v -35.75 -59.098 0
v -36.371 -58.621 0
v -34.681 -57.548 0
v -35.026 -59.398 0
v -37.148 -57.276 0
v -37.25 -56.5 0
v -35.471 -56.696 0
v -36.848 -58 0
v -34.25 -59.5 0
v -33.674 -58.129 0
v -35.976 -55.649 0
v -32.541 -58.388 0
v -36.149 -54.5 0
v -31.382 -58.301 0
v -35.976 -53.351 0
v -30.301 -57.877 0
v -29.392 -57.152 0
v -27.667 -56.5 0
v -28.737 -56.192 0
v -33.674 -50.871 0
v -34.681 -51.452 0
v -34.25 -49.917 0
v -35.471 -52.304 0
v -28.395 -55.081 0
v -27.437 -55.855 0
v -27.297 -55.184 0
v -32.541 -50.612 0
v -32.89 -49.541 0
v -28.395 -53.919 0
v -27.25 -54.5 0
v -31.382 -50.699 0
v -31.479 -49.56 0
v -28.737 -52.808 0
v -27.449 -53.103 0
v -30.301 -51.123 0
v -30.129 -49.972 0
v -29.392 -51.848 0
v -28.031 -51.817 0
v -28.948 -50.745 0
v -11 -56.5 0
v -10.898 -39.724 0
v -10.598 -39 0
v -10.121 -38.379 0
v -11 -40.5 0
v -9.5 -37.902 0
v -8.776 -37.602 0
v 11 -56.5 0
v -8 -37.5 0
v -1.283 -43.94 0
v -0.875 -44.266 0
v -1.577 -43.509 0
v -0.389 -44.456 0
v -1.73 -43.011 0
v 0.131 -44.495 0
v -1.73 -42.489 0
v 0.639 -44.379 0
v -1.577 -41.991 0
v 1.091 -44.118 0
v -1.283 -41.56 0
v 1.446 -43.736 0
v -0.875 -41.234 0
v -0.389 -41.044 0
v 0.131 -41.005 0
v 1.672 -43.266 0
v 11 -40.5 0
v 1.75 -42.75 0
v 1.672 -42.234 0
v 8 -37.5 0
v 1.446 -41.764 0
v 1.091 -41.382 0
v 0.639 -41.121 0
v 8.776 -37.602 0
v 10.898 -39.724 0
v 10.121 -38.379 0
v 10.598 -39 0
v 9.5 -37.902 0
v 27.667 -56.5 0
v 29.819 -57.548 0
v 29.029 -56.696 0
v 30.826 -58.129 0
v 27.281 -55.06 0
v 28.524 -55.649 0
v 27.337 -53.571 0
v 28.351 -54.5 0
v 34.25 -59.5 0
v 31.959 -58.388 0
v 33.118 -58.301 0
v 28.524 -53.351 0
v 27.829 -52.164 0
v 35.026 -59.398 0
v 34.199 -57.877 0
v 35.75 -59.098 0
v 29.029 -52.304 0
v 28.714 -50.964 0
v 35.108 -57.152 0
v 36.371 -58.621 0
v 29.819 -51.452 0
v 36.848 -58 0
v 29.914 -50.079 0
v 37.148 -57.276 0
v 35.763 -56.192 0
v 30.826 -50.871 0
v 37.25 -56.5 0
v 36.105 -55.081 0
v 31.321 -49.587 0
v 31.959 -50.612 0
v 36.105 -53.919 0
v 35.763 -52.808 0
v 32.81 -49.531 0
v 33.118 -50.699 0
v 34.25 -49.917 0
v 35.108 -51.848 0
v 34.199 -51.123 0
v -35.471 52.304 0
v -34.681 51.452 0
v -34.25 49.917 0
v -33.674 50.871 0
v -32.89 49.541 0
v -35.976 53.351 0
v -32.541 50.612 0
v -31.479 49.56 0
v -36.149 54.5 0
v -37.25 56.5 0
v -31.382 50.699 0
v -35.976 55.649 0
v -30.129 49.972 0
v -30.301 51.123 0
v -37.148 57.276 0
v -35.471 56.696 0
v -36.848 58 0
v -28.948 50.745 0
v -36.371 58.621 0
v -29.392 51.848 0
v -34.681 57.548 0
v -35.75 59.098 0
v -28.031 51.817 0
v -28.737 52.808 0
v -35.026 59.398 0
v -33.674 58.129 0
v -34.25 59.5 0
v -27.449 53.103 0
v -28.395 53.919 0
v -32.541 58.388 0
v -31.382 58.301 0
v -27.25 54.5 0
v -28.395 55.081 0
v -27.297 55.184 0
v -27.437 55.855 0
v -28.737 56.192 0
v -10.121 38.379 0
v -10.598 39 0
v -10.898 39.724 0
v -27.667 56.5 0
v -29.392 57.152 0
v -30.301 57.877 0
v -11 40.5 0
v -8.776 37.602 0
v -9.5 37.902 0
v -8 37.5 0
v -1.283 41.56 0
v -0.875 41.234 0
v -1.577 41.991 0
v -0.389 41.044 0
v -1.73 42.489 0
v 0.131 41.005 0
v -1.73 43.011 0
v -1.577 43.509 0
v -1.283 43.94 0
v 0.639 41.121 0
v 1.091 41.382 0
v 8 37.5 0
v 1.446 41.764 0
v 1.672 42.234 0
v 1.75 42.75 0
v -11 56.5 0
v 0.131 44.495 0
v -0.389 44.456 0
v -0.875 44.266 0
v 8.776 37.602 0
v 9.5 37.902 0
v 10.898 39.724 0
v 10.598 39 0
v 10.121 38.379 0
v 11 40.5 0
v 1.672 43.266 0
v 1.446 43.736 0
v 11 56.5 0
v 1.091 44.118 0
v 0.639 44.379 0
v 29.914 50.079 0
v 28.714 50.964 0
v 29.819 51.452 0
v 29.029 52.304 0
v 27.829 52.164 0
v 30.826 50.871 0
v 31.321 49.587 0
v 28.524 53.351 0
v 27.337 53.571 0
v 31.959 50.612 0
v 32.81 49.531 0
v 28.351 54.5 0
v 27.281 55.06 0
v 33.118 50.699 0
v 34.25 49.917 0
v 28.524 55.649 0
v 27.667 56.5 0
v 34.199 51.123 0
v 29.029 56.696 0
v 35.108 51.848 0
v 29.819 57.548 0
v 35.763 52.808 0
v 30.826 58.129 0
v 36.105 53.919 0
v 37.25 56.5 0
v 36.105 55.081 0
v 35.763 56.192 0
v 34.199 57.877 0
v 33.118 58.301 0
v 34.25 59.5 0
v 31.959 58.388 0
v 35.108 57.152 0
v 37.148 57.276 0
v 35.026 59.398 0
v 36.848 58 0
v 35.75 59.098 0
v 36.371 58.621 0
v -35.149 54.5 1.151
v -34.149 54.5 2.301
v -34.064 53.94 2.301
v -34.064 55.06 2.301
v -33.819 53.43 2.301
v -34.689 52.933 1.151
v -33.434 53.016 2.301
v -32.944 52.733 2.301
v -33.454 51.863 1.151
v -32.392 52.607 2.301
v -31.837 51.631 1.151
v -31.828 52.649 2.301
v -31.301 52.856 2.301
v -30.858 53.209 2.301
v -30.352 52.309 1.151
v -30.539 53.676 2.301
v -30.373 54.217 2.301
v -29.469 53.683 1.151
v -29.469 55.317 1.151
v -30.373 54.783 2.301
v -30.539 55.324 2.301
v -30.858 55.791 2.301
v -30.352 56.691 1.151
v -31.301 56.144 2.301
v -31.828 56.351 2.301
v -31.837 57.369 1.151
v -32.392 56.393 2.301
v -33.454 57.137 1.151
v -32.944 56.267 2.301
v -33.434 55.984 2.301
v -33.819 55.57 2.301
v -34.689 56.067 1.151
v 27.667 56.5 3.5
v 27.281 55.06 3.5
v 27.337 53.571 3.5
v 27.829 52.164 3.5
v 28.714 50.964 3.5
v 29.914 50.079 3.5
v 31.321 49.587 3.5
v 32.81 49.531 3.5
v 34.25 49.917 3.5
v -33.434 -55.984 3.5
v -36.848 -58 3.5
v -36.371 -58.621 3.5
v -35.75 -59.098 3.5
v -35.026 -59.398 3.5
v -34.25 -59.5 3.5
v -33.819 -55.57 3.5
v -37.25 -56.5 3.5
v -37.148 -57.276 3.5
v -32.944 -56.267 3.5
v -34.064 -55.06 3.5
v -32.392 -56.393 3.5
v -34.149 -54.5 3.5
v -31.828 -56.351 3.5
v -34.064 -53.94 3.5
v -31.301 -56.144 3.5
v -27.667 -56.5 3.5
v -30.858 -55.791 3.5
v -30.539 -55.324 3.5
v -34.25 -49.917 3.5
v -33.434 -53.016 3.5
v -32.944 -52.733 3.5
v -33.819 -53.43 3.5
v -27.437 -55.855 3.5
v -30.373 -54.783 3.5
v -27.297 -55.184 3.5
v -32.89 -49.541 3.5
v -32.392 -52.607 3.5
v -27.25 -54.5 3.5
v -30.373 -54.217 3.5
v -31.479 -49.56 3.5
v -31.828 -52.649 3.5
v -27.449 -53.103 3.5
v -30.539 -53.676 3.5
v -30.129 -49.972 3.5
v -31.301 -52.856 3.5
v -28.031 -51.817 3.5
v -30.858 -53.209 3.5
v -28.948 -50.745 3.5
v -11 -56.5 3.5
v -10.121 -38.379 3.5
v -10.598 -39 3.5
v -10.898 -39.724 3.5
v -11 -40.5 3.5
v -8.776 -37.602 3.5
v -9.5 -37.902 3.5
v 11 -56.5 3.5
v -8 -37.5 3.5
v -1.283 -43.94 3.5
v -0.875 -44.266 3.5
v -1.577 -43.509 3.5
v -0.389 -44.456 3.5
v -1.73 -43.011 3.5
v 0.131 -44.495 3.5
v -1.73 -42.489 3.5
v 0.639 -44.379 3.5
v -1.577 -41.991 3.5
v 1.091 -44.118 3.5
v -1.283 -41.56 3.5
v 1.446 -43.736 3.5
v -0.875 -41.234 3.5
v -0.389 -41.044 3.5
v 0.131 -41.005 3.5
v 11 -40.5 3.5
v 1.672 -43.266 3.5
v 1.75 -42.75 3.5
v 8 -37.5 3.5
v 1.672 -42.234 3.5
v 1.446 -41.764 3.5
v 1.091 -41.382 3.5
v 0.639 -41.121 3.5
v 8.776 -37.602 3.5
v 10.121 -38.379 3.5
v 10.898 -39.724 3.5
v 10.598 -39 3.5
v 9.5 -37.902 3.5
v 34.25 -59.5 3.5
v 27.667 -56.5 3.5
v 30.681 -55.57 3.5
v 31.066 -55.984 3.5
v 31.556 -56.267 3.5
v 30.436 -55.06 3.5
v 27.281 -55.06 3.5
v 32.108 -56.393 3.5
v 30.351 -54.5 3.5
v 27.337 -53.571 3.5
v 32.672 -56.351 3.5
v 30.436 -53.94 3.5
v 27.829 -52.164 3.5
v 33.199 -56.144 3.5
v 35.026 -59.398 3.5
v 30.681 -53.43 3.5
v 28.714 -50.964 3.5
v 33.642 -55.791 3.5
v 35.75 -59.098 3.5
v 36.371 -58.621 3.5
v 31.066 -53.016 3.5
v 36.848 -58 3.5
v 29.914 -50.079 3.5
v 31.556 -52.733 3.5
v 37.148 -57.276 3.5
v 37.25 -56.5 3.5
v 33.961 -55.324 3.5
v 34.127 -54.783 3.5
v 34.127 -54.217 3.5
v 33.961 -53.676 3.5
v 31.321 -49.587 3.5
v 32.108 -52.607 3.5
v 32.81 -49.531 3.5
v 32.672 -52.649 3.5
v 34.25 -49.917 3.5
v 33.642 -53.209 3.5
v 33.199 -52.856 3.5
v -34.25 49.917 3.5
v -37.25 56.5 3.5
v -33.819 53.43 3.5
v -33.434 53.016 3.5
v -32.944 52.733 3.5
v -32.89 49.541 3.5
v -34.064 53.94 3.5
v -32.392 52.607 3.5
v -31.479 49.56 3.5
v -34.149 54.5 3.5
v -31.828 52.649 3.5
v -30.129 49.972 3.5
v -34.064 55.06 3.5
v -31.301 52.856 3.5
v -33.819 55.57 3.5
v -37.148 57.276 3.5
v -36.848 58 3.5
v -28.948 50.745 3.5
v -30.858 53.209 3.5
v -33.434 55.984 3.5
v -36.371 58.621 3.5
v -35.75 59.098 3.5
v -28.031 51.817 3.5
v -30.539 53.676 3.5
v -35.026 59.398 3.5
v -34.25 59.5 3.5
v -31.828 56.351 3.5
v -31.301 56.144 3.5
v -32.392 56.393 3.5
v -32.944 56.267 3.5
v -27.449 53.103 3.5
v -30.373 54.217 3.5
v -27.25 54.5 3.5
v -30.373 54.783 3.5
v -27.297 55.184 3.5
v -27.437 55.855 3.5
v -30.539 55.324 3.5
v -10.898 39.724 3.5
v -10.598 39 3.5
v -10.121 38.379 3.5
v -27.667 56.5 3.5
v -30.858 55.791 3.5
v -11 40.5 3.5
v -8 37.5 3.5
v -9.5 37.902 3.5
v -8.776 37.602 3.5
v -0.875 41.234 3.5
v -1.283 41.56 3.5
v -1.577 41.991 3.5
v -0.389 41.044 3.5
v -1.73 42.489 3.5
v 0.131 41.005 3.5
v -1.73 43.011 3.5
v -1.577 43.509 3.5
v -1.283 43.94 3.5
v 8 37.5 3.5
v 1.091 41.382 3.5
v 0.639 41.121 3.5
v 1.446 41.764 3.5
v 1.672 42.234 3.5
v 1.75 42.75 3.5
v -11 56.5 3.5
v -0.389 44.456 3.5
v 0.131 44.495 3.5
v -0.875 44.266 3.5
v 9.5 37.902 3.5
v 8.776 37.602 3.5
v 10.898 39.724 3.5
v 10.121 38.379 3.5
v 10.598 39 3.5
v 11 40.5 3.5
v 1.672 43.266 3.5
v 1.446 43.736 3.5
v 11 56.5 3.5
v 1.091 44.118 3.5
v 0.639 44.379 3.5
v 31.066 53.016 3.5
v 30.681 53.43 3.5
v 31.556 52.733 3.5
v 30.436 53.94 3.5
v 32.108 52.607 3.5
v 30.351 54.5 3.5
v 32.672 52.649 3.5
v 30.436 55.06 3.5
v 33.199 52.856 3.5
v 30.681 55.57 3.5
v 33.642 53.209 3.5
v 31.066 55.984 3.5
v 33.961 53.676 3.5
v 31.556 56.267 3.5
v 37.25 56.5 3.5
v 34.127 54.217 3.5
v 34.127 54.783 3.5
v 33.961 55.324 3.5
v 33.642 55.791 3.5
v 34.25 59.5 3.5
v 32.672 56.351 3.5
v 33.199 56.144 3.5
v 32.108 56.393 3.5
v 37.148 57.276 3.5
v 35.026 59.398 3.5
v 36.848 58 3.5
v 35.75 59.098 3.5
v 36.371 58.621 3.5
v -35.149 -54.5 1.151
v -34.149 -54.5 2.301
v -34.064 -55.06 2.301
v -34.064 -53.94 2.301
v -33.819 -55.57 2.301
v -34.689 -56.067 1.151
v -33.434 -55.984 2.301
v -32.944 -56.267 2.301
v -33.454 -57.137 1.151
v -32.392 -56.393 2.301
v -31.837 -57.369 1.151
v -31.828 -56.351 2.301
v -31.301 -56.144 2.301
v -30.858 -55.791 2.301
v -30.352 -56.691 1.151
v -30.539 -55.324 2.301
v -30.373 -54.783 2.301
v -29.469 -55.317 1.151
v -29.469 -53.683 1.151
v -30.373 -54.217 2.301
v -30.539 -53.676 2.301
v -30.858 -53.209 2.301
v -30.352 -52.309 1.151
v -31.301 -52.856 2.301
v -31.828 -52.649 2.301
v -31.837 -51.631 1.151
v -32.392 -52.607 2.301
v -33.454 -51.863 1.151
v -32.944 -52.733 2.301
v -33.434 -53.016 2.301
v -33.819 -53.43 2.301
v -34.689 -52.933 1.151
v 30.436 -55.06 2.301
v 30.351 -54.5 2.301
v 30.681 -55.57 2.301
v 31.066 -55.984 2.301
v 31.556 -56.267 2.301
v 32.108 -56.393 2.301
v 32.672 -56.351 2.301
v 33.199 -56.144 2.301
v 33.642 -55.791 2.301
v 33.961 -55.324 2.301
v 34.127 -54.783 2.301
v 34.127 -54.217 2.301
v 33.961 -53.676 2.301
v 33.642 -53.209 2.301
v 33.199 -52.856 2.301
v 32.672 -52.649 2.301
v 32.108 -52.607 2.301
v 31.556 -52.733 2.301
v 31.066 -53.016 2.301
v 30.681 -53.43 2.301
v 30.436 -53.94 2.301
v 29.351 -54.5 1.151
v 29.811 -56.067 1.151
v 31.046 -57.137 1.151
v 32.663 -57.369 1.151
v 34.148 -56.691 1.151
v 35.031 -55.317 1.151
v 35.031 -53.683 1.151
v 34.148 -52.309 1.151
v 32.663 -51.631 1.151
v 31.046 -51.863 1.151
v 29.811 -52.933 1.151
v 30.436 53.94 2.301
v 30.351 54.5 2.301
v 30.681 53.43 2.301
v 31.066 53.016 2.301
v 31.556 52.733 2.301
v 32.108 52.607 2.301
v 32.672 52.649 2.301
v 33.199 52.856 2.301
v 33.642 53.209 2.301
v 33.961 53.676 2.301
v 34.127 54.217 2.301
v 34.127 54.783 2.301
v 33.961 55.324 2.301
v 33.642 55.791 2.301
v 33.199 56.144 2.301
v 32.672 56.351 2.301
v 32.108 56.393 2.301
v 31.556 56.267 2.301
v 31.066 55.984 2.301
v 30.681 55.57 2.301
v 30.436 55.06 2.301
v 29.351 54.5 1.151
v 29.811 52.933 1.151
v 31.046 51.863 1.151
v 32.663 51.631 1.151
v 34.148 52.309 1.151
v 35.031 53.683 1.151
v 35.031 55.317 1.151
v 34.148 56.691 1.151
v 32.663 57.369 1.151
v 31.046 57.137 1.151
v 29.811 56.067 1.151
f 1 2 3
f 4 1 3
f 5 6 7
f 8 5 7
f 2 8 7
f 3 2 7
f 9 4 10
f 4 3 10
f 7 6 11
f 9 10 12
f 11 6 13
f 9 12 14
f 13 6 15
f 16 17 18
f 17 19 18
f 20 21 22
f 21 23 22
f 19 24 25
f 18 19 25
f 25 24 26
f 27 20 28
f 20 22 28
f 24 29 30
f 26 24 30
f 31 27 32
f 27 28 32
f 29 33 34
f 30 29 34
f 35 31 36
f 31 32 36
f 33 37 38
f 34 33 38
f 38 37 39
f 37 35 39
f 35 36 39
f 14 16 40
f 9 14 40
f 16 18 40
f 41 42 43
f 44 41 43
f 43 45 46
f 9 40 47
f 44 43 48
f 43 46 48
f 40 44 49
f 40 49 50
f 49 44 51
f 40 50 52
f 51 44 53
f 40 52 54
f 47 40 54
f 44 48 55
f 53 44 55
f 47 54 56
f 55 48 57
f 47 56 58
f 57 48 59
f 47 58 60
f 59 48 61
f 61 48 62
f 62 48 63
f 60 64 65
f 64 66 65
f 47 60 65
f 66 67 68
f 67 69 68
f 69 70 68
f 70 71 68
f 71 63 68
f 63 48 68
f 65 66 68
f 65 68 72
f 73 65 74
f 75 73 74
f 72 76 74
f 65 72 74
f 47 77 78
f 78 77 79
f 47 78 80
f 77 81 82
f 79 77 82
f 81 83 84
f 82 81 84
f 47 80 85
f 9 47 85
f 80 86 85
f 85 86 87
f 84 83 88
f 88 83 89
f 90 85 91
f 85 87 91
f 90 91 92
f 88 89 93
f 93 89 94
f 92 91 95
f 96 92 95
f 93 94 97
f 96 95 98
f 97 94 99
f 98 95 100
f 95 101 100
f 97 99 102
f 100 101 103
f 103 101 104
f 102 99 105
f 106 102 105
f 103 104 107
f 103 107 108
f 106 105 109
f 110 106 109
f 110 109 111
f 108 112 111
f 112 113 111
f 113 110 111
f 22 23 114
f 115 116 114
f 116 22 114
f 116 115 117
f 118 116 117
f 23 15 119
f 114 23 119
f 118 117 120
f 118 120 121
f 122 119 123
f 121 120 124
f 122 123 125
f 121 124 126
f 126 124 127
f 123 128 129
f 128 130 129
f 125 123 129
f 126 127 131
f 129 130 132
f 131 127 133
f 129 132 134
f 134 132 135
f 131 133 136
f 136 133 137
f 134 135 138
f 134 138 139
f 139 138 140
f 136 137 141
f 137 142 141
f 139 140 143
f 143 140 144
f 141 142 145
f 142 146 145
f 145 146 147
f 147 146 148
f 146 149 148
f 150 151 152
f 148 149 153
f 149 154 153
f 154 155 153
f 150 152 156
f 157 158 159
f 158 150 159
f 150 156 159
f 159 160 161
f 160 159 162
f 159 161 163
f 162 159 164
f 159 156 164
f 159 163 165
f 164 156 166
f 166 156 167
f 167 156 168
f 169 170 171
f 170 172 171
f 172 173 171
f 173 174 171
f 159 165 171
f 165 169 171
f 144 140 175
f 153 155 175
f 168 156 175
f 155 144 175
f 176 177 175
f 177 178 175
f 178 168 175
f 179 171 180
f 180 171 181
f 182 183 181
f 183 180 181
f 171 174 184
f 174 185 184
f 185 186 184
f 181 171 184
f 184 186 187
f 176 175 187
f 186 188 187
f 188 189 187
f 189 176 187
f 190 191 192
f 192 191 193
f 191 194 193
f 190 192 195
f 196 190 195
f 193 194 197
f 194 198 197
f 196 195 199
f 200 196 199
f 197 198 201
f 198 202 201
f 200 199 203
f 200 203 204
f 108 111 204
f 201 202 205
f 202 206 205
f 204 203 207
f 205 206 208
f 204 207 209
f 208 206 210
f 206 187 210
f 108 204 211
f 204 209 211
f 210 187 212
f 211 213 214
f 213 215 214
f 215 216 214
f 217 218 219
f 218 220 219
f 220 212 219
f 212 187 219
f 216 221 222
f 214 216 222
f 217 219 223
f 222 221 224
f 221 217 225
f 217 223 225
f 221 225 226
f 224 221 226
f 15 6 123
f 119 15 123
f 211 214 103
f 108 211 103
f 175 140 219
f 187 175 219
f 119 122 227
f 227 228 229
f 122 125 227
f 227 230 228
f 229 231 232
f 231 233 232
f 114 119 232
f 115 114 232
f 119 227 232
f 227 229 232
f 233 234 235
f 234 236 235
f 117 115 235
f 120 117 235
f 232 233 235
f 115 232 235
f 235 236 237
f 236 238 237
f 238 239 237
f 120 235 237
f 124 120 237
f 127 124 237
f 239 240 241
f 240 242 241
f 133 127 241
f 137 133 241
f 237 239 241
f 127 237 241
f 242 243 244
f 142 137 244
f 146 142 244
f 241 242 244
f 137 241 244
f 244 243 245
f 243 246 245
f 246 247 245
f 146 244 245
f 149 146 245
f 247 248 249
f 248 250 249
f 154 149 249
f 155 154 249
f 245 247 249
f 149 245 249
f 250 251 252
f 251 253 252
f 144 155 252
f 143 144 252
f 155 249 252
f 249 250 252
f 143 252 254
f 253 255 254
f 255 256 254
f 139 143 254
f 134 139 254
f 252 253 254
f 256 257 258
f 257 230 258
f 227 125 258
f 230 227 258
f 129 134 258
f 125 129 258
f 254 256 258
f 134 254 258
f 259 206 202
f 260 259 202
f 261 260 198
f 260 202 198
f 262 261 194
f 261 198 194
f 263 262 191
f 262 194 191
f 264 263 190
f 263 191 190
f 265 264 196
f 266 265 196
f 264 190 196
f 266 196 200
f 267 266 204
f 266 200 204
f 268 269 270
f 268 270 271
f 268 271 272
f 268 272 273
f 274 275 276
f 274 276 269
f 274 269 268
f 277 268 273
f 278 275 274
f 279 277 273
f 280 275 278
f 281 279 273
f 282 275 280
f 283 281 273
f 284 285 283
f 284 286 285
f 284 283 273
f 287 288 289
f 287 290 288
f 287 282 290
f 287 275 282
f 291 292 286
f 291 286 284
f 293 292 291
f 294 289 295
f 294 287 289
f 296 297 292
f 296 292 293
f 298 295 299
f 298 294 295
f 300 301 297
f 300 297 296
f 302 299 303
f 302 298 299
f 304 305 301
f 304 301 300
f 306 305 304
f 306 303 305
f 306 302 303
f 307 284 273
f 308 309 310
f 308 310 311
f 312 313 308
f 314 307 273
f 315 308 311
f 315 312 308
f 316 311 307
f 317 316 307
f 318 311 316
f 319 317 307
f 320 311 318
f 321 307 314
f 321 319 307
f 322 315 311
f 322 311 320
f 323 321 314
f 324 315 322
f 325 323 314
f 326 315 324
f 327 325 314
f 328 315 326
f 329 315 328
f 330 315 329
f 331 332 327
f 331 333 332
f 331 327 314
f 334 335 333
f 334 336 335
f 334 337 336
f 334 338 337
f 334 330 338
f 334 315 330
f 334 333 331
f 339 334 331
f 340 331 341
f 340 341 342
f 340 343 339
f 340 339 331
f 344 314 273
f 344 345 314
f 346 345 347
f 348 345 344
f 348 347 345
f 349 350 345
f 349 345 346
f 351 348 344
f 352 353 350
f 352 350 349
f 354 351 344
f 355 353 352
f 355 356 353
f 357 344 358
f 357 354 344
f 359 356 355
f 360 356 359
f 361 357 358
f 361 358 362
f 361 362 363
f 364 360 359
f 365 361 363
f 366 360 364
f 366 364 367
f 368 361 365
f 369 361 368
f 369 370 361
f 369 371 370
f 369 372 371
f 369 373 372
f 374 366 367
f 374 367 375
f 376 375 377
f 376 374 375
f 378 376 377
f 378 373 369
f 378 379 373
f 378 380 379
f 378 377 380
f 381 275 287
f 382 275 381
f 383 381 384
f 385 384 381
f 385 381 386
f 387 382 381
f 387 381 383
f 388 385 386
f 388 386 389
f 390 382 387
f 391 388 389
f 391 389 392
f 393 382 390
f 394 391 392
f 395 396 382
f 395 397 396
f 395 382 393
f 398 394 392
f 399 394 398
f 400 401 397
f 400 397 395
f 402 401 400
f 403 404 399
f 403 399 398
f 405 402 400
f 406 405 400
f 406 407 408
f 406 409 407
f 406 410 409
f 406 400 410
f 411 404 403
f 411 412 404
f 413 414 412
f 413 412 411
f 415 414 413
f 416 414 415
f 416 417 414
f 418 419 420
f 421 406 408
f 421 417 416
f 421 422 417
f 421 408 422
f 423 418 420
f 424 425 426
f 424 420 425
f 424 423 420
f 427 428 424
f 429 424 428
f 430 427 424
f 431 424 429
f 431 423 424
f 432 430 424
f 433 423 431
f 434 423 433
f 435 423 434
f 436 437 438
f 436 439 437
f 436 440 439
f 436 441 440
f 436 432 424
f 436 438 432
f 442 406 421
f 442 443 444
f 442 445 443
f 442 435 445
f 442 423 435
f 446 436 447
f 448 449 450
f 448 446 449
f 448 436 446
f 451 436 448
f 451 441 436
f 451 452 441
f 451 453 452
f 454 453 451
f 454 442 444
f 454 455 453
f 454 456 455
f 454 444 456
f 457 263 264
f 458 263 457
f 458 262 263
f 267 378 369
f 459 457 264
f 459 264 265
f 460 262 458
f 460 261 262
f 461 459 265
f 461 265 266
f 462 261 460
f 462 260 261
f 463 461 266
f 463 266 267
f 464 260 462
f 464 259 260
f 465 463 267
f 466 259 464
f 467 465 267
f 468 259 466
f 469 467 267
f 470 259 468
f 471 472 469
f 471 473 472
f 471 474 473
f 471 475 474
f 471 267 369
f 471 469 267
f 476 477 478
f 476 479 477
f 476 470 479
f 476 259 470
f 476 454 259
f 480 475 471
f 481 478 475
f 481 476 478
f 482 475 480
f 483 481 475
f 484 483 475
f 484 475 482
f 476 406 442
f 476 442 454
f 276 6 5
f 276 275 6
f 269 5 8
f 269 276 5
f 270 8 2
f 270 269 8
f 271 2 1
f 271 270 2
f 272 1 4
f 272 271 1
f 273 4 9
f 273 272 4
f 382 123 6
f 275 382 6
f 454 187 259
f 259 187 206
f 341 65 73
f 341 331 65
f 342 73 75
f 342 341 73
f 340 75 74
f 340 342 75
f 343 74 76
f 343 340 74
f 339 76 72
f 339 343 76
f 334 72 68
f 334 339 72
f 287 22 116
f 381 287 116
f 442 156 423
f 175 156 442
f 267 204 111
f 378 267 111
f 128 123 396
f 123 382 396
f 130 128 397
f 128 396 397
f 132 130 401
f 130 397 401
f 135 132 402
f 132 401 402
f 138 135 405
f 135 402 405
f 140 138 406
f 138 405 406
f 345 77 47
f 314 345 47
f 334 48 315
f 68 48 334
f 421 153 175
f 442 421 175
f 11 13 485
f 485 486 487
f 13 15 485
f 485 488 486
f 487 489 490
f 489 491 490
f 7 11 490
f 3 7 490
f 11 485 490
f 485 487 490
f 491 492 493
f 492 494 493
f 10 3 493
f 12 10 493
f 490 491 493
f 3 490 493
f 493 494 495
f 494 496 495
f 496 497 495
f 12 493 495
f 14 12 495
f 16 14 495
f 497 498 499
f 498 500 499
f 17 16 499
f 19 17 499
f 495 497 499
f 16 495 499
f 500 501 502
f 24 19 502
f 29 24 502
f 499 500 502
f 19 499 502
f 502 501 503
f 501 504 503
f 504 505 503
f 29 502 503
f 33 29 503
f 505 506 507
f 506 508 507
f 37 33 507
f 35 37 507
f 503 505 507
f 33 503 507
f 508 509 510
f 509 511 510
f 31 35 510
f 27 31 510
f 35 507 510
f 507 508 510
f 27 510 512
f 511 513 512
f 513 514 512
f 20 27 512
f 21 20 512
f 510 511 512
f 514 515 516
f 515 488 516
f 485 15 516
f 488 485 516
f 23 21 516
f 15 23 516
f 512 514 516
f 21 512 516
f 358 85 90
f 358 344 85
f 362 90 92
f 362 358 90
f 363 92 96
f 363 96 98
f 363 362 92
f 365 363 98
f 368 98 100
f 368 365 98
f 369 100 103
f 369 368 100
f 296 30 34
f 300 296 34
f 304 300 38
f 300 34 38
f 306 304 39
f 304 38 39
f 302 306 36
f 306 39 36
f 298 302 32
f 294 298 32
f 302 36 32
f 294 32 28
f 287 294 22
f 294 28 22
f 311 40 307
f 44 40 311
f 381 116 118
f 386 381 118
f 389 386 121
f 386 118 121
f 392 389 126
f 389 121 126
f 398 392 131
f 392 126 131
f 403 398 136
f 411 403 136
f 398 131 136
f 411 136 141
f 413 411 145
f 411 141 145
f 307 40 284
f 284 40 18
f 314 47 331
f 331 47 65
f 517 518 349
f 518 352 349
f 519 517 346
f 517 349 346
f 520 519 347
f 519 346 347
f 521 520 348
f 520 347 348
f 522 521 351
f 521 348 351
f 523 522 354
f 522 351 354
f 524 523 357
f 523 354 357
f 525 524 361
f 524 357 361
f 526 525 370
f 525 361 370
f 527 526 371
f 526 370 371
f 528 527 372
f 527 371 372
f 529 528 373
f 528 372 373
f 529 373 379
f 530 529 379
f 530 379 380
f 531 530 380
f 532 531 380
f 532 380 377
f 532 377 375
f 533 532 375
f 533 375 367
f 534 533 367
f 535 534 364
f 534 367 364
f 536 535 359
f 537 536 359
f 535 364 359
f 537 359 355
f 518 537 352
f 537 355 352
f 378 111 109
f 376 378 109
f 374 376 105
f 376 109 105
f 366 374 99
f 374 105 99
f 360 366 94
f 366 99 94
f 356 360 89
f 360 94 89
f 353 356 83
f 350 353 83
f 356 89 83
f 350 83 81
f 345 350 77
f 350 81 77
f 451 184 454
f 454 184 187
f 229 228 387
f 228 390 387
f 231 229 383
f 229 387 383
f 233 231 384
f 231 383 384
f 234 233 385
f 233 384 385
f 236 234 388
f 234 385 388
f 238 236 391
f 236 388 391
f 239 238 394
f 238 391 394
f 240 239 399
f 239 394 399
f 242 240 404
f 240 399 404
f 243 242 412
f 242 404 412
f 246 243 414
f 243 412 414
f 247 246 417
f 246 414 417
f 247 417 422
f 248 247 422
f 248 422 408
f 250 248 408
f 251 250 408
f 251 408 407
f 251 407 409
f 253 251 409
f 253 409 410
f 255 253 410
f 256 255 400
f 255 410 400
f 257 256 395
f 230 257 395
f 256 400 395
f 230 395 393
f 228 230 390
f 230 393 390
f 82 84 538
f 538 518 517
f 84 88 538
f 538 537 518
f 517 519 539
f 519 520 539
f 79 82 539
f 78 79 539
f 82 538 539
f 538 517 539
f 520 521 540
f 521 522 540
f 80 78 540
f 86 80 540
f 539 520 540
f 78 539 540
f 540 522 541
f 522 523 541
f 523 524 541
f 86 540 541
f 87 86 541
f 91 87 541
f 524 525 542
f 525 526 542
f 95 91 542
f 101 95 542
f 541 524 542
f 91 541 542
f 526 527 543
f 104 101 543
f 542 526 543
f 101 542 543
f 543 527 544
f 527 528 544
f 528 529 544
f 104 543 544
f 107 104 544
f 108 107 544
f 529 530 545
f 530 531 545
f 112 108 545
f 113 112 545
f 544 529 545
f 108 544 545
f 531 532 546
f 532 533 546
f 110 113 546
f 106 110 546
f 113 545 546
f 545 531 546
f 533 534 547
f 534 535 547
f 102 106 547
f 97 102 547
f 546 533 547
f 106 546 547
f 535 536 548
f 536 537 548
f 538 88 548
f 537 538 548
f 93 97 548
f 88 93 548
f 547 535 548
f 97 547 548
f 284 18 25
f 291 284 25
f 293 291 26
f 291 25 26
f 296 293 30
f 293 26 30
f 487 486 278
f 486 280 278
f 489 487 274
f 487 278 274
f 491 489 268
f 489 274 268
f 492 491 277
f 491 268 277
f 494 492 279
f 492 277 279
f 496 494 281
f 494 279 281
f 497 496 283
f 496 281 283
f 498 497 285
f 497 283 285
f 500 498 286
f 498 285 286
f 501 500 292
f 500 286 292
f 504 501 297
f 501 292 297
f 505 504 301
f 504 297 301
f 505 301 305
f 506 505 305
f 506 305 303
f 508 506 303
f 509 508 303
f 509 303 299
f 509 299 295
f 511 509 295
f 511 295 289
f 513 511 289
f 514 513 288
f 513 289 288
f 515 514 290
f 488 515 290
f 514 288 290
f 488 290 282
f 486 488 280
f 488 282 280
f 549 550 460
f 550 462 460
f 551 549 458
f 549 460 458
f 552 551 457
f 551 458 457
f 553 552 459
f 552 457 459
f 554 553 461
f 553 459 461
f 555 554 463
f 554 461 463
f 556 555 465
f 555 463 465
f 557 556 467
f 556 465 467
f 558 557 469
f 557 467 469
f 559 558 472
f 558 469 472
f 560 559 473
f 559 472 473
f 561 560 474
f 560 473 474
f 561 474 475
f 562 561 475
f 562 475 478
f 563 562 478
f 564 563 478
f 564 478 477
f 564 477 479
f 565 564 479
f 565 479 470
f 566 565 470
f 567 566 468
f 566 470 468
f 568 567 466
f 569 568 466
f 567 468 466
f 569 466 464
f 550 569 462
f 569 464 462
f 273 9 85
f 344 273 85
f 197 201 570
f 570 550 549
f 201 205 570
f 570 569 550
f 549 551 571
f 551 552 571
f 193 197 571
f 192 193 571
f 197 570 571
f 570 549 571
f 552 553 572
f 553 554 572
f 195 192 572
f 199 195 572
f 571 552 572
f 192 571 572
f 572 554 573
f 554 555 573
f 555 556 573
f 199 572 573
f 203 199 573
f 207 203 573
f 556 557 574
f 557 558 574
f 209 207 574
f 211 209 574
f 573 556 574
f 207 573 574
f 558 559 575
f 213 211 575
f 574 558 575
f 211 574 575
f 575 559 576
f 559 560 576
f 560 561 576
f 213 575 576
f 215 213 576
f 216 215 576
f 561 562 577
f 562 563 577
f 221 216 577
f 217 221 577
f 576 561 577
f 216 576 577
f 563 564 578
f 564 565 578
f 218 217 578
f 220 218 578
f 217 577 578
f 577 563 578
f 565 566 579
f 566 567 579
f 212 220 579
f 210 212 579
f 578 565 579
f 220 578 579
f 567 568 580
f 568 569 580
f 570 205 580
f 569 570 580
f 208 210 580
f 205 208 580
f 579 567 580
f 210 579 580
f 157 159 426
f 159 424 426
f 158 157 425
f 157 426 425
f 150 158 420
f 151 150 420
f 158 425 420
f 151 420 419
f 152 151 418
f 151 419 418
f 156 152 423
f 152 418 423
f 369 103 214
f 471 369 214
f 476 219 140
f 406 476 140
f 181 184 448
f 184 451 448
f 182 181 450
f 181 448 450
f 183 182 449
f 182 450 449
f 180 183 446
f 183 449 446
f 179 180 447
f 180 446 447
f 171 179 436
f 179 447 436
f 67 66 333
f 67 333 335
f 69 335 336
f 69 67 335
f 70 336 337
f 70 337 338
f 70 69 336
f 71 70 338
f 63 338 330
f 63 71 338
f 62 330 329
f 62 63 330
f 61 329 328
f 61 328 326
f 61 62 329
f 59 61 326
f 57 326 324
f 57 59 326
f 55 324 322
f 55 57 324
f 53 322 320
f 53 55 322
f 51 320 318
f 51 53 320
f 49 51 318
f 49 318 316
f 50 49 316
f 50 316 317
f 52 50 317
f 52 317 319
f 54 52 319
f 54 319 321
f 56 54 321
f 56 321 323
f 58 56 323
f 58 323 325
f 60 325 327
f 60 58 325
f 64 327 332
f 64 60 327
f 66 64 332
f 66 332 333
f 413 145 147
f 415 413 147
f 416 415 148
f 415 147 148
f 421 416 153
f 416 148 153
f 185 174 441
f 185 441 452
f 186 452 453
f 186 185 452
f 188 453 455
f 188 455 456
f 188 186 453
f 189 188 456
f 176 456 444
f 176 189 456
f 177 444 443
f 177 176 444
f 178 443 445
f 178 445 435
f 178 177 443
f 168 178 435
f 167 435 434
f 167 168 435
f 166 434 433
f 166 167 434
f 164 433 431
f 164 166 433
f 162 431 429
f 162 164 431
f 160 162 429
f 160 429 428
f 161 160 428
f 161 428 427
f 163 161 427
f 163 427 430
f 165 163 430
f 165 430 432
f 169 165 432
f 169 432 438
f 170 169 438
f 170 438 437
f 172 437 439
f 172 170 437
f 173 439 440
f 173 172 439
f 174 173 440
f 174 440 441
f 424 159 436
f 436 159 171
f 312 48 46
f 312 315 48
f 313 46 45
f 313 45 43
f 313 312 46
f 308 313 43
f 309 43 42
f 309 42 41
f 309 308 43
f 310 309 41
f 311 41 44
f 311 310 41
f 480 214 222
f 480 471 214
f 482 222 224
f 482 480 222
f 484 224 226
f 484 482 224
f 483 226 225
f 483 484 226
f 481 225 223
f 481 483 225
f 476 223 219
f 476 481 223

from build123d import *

# Parameters (mm, degrees)
F0_R           = 1.8985
F1_DEPTH       = 3.5
F2_R           = 3
F0_W           = 22
F0_H           = 19
F0_R_2         = 1.75
F3_DEPTH       = 3.5
F4_D           = 3.7973
F4_DEPTH       = 14.38125
F4_CSINK_D     = 7.7978
F4_CSINK_ANGLE = 82
F4_TIP         = 1.1408240143
F5_R           = 3


# Not quite as in the source:
# - a feature names something its author has since deleted; it is built from what else it names


with BuildPart() as f1:
    # F0 (on Top) → F1 (new body)
    with BuildSketch(Plane.XY):
        with BuildLine():
            Line((-32.25, 59.5), (-37.25, 59.5))
            Line((-37.25, 59.5), (-37.25, 54.5))
            ThreePointArc((-37.25, 54.5), (-35.7855339059, 58.0355339059), (-32.25, 59.5))
        make_face()
        with BuildLine():
            Line((37.25, 59.5), (32.25, 59.5))
            ThreePointArc((32.25, 59.5), (35.7855339059, 58.0355339059), (37.25, 54.5))
            Line((37.25, 54.5), (37.25, 59.5))
        make_face()
        with BuildLine():
            ThreePointArc((-32.25, -59.5), (-35.7855339059, -58.0355339059), (-37.25, -54.5))
            Line((-37.25, -54.5), (-37.25, -59.5))
            Line((-37.25, -59.5), (-32.25, -59.5))
        make_face()
        with BuildLine():
            Line((37.25, -59.5), (37.25, -54.5))
            ThreePointArc((37.25, -54.5), (35.7855339059, -58.0355339059), (32.25, -59.5))
            Line((32.25, -59.5), (37.25, -59.5))
        make_face()
        with BuildLine():
            Line((32.25, 59.5), (-32.25, 59.5))
            ThreePointArc((-32.25, 59.5), (-29.5113872125, 58.6833001327), (-27.667424305, 56.5))
            Line((-27.667424305, 56.5), (-11, 56.5))
            Line((-11, 56.5), (11, 56.5))
            Line((11, 56.5), (27.667424305, 56.5))
            ThreePointArc((27.667424305, 56.5), (29.5113872125, 58.6833001327), (32.25, 59.5))
        make_face()
        with BuildLine():
            ThreePointArc((-27.667424305, -56.5), (-29.5113872125, -58.6833001327), (-32.25, -59.5))
            Line((-32.25, -59.5), (32.25, -59.5))
            ThreePointArc((32.25, -59.5), (29.5113872125, -58.6833001327), (27.667424305, -56.5))
            Line((27.667424305, -56.5), (11, -56.5))
            Line((11, -56.5), (-11, -56.5))
            Line((-11, -56.5), (-27.667424305, -56.5))
        make_face()
        with BuildLine():
            ThreePointArc((-34.25, 49.917424305), (-36.4333001327, 51.7613872125), (-37.25, 54.5))
            Line((-37.25, 54.5), (-37.25, -54.5))
            ThreePointArc((-37.25, -54.5), (-36.4333001327, -51.7613872125), (-34.25, -49.917424305))
            Line((-34.25, -49.917424305), (-34.25, 49.917424305))
        make_face()
        with BuildLine():
            Line((37.25, -54.5), (37.25, 54.5))
            ThreePointArc((37.25, 54.5), (36.4333001327, 51.7613872125), (34.25, 49.917424305))
            Line((34.25, 49.917424305), (34.25, -49.917424305))
            ThreePointArc((34.25, -49.917424305), (36.4333001327, -51.7613872125), (37.25, -54.5))
        make_face()
        with BuildLine():
            ThreePointArc((-27.667424305, 56.5), (-29.5113872125, 58.6833001327), (-32.25, 59.5))
            ThreePointArc((-32.25, 59.5), (-35.7855339059, 58.0355339059), (-37.25, 54.5))
            ThreePointArc((-37.25, 54.5), (-36.4333001327, 51.7613872125), (-34.25, 49.917424305))
            Line((-34.25, 49.917424305), (-34.25, 56.5))
            Line((-34.25, 56.5), (-27.667424305, 56.5))
        make_face()
        with BuildLine():
            ThreePointArc((32.25, -59.5), (35.7855339059, -58.0355339059), (37.25, -54.5))
            ThreePointArc((37.25, -54.5), (36.4333001327, -51.7613872125), (34.25, -49.917424305))
            Line((34.25, -49.917424305), (34.25, -56.5))
            Line((34.25, -56.5), (27.667424305, -56.5))
            ThreePointArc((27.667424305, -56.5), (29.5113872125, -58.6833001327), (32.25, -59.5))
        make_face()
        with BuildLine():
            ThreePointArc((-27.25, 54.5), (-27.3554684353, 55.5215482184), (-27.667424305, 56.5))
            Line((-27.667424305, 56.5), (-34.25, 56.5))
            Line((-34.25, 56.5), (-34.25, 49.917424305))
            ThreePointArc((-34.25, 49.917424305), (-29.5113872125, 50.3166998673), (-27.25, 54.5))
        make_face()
        with Locations((-32.25, 54.5)):
            Circle(F0_R, mode=Mode.SUBTRACT)
        with BuildLine():
            ThreePointArc((-27.25, -54.5), (-29.5113872125, -50.3166998673), (-34.25, -49.917424305))
            Line((-34.25, -49.917424305), (-34.25, -56.5))
            Line((-34.25, -56.5), (-27.667424305, -56.5))
            ThreePointArc((-27.667424305, -56.5), (-27.3554684353, -55.5215482184), (-27.25, -54.5))
        make_face()
        with Locations((-32.25, -54.5)):
            Circle(F0_R, mode=Mode.SUBTRACT)
        with BuildLine():
            ThreePointArc((-34.25, -49.917424305), (-36.4333001327, -51.7613872125), (-37.25, -54.5))
            ThreePointArc((-37.25, -54.5), (-35.7855339059, -58.0355339059), (-32.25, -59.5))
            ThreePointArc((-32.25, -59.5), (-29.5113872125, -58.6833001327), (-27.667424305, -56.5))
            Line((-27.667424305, -56.5), (-34.25, -56.5))
            Line((-34.25, -56.5), (-34.25, -49.917424305))
        make_face()
        with BuildLine():
            Line((34.25, -56.5), (34.25, -49.917424305))
            ThreePointArc((34.25, -49.917424305), (28.7144660941, -50.9644660941), (27.667424305, -56.5))
            Line((27.667424305, -56.5), (34.25, -56.5))
        make_face()
        with Locations((32.25, -54.5)):
            Circle(F0_R, mode=Mode.SUBTRACT)
        with BuildLine():
            Line((34.25, 56.5), (27.667424305, 56.5))
            ThreePointArc((27.667424305, 56.5), (28.7144660941, 50.9644660941), (34.25, 49.917424305))
            Line((34.25, 49.917424305), (34.25, 56.5))
        make_face()
        with Locations((32.25, 54.5)):
            Circle(F0_R, mode=Mode.SUBTRACT)
        with BuildLine():
            ThreePointArc((37.25, 54.5), (35.7855339059, 58.0355339059), (32.25, 59.5))
            ThreePointArc((32.25, 59.5), (29.5113872125, 58.6833001327), (27.667424305, 56.5))
            Line((27.667424305, 56.5), (34.25, 56.5))
            Line((34.25, 56.5), (34.25, 49.917424305))
            ThreePointArc((34.25, 49.917424305), (36.4333001327, 51.7613872125), (37.25, 54.5))
        make_face()
        with Locations((-32.25, 54.5)):
            Circle(F0_R)
        with Locations((32.25, 54.5)):
            Circle(F0_R)
        with Locations((-32.25, -54.5)):
            Circle(F0_R)
        with Locations((32.25, -54.5)):
            Circle(F0_R)
    extrude(amount=F1_DEPTH)

    # F2
    f2_edges = [f1.edges().sort_by_distance(p)[0] for p in [
        (-37.25, 59.5, 1.75),
        (37.25, 59.5, 1.75),
        (37.25, -59.5, 1.75),
        (-37.25, -59.5, 1.75),
    ]]
    fillet(f2_edges, radius=F2_R)

    # F0 (on Top) → F3 (join)
    with BuildSketch(Plane.XY):
        with Locations((0, 47)):
            Rectangle(F0_W, F0_H)
        with Locations((0, 42.75)):
            Circle(F0_R_2, mode=Mode.SUBTRACT)
        with Locations((0, -47)):
            Rectangle(F0_W, F0_H)
        with Locations((0, -42.75)):
            Circle(F0_R_2, mode=Mode.SUBTRACT)
    extrude(amount=F3_DEPTH)

    # F4
    with Locations(Plane(origin=(0, 0, 0), x_dir=(1, 0, 0), z_dir=(0, 0, -1))):
        with Locations((-32.25, -54.5), (32.25, -54.5), (32.25, 54.5), (-32.25, 54.5)):
            CounterSinkHole(F4_D / 2, F4_CSINK_D / 2, depth=F4_DEPTH, counter_sink_angle=F4_CSINK_ANGLE)
            with Locations((0, 0, -(F4_DEPTH + F4_TIP / 2))):  # 118° drill point
                Cone(0, F4_D / 2, F4_TIP, mode=Mode.SUBTRACT)

    # F5
    f5_edges = [f1.edges().sort_by_distance(p)[0] for p in [
        (-11, 37.5, 1.75),
        (11, 37.5, 1.75),
        (11, -37.5, 1.75),
        (-11, -37.5, 1.75),
    ]]
    fillet(f5_edges, radius=F5_R)


solid = f1.part
